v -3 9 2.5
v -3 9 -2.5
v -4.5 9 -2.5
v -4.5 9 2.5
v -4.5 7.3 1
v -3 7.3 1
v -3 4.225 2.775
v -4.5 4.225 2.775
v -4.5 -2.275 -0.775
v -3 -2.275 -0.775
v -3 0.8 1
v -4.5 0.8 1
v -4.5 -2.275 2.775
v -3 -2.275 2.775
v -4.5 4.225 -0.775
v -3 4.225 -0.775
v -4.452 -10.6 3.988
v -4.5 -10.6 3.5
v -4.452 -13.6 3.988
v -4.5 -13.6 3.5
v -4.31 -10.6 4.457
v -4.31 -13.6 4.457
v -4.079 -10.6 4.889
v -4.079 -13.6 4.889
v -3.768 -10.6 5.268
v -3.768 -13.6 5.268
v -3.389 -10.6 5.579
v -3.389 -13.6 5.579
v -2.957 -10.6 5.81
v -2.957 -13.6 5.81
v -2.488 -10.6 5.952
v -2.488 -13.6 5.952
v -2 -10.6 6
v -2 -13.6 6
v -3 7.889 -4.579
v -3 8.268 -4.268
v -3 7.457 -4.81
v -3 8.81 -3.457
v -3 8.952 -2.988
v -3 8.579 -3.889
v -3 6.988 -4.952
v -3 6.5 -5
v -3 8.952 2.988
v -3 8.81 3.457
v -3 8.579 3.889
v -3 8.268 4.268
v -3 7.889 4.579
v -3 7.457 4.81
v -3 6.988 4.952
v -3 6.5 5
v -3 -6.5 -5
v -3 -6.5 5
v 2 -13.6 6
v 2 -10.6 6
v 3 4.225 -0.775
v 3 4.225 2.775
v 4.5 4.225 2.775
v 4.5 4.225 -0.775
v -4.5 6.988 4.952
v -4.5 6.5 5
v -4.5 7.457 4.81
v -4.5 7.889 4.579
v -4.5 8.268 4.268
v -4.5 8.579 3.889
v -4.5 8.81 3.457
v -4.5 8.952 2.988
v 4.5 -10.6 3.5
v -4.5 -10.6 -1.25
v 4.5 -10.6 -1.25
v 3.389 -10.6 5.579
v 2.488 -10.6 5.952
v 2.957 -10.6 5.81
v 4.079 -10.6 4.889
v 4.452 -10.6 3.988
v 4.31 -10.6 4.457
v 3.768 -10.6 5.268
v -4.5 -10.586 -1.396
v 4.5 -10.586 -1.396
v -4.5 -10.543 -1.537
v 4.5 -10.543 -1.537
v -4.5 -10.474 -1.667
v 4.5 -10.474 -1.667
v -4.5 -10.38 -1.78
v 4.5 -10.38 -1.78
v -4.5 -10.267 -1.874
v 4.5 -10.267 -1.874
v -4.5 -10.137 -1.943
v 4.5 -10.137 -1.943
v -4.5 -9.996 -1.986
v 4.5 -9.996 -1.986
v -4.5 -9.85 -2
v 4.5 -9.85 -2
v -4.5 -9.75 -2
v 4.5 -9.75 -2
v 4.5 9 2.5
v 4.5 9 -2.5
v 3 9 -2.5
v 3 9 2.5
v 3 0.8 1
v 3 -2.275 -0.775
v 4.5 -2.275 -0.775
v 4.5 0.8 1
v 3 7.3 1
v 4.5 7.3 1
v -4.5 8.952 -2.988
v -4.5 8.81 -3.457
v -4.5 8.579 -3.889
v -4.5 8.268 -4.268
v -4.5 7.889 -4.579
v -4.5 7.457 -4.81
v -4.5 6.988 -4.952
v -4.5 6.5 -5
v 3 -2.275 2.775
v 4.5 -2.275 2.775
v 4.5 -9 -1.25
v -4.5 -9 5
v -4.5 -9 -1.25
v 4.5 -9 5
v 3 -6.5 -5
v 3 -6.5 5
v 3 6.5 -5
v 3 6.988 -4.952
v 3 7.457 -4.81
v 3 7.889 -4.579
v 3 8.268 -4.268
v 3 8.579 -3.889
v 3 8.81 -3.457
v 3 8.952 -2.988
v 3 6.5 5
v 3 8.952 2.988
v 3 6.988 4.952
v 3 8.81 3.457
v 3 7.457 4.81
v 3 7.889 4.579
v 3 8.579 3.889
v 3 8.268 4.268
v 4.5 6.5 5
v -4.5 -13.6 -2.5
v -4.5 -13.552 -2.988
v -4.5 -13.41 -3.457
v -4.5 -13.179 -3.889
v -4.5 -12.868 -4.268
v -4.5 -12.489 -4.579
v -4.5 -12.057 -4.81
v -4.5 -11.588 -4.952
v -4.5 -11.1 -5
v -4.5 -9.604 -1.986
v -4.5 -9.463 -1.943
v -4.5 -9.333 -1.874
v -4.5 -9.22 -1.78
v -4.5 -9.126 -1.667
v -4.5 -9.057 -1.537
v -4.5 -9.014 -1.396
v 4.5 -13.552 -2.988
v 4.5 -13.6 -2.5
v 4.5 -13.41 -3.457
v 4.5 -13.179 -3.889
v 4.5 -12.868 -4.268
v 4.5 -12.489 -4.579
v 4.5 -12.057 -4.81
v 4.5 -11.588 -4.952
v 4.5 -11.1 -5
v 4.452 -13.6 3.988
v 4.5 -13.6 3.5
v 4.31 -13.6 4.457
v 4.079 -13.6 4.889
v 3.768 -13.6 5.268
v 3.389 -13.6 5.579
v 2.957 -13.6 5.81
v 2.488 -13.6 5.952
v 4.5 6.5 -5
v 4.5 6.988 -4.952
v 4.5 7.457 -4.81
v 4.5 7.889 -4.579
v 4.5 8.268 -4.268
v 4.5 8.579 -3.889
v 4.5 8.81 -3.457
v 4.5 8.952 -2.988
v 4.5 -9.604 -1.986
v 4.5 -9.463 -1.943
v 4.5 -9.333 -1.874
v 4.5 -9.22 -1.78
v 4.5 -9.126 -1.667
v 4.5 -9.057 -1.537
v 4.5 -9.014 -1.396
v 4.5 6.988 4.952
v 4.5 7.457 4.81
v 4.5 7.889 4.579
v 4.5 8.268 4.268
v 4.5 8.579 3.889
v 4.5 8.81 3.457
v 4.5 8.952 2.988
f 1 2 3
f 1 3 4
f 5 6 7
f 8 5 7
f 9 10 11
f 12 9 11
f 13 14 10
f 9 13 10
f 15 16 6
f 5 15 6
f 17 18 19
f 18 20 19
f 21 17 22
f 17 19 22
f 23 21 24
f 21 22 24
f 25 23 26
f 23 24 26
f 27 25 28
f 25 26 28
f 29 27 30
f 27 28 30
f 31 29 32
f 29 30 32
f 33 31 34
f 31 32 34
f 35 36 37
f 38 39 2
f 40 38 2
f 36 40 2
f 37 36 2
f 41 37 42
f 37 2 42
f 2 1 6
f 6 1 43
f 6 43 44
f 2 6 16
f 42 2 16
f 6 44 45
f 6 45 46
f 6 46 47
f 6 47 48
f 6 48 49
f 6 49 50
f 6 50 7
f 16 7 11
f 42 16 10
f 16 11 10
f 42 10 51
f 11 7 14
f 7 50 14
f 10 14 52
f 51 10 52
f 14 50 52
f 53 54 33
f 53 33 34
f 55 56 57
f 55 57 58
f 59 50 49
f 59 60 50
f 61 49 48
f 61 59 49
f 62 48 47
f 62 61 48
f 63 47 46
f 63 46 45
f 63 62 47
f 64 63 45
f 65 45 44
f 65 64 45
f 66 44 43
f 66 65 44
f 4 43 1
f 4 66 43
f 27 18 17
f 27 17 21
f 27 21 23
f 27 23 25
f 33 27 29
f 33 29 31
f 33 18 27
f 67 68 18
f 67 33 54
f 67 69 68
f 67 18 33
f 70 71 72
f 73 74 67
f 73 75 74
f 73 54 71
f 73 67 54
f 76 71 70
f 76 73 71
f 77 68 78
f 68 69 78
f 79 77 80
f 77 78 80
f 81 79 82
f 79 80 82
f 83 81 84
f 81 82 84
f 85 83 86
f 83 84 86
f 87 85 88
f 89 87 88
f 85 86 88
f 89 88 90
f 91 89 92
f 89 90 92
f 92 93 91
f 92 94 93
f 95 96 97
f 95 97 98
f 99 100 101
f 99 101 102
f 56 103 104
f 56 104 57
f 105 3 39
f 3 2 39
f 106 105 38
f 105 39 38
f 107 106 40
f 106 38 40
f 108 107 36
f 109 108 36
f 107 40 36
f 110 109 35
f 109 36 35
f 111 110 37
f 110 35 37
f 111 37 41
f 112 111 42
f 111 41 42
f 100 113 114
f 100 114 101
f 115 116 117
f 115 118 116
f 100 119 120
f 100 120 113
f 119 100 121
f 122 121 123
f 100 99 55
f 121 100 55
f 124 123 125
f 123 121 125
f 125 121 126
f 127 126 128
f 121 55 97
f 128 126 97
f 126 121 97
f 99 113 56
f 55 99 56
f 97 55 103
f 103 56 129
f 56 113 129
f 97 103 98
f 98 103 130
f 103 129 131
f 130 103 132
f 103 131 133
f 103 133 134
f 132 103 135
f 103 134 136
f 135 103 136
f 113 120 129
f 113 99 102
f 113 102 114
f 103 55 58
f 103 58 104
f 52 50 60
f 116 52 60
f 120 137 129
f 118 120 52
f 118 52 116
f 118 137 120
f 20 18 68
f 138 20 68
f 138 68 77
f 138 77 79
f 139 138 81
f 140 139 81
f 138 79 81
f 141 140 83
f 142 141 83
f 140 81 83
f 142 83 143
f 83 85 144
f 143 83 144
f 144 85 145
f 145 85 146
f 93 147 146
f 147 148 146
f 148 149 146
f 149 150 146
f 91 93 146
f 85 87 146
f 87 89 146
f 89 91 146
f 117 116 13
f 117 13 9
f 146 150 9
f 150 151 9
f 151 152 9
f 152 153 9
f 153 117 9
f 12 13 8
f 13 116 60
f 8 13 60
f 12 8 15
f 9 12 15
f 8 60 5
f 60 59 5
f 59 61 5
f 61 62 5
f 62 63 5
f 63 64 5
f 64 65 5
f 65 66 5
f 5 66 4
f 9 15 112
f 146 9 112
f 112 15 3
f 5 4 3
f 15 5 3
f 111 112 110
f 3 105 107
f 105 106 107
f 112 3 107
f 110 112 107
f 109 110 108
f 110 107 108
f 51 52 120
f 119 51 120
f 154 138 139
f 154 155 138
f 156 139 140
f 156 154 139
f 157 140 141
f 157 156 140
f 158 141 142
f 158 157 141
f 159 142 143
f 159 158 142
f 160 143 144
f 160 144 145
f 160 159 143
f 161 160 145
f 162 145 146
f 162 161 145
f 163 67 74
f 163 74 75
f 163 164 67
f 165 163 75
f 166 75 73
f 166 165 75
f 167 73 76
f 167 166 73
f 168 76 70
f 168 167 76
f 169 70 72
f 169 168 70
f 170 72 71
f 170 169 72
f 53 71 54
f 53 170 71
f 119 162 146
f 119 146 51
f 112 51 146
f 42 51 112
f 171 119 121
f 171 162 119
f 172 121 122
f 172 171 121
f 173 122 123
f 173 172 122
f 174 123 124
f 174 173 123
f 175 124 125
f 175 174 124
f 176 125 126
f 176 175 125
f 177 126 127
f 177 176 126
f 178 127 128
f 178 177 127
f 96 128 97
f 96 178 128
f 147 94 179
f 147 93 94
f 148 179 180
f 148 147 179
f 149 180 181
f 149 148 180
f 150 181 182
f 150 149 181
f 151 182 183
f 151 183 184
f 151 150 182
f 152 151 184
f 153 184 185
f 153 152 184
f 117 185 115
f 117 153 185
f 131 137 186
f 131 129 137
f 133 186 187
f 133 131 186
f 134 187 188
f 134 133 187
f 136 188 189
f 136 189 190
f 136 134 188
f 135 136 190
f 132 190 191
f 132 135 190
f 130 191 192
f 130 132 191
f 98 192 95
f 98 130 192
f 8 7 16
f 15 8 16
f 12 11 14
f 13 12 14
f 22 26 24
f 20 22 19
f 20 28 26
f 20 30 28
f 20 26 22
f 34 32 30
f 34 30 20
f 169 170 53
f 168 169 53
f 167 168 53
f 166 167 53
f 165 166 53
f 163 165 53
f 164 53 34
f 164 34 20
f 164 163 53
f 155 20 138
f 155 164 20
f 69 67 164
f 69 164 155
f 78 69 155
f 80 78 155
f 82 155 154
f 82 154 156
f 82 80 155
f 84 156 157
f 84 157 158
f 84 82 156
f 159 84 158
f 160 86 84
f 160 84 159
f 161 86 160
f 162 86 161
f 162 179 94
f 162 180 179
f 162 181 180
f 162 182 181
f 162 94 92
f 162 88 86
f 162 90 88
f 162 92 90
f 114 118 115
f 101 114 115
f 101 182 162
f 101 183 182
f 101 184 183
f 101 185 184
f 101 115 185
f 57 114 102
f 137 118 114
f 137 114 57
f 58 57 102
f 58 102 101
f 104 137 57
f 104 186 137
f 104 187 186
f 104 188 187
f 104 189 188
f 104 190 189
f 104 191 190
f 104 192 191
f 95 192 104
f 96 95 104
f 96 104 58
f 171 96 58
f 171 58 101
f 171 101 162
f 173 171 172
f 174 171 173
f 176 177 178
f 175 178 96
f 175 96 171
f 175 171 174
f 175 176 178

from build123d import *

# Parameters (mm, degrees)
BOSS_EXTRUDE1_DEPTH     = 4.5
CUT_EXTRUDE1_DEPTH      = 10
CUT_EXTRUDE2_DEPTH      = 5.5
CUT_EXTRUDE2_DEPTH_BACK = 5.5
FILLET1_R               = 2.5
FILLET2_R               = 0.75


with BuildPart() as part:
    # Sketch2 → Boss-Extrude1 (new body, symmetric)
    with BuildSketch(Plane(origin=(0, 0, 0), x_dir=(0, 0, -1), z_dir=(1, 0, 0))):
        Polygon((2, -9), (2, -10.6), (-6, -10.6), (-6, -13.6), (5, -13.6), (5, -9), (5, 9), (-5, 9), (-5, -9), align=None)
    extrude(amount=BOSS_EXTRUDE1_DEPTH, both=True)

    # Sketch3 → Cut-Extrude1 (cut)
    with BuildSketch(Plane.XY.offset(5)):
        Polygon((-3, 6.5), (-3, -6.5), (3, -6.5), (3, 6.5), (3, 9), (-3, 9), align=None)
    extrude(amount=-CUT_EXTRUDE1_DEPTH, mode=Mode.SUBTRACT)

    # Sketch4 → Cut-Extrude2 (cut, two sides)
    with BuildSketch(Plane(origin=(0, 0, 0), x_dir=(0, 0, -1), z_dir=(1, 0, 0))) as cut_extrude2_sk:
        Polygon((0.775352078, 4.225), (-1, 7.3), (-2.775352078, 4.225), align=None)
        Polygon((0.775352078, -2.275), (-1, 0.8), (-2.775352078, -2.275), align=None)
    extrude(amount=CUT_EXTRUDE2_DEPTH, mode=Mode.SUBTRACT)
    extrude(cut_extrude2_sk.sketch, amount=-CUT_EXTRUDE2_DEPTH_BACK, mode=Mode.SUBTRACT)

    # Fillet1
    fillet1_edges = [part.edges().sort_by_distance(p)[0] for p in [
        (0, -13.6, -5),
        (3.75, 9, 5),
        (3.75, 9, -5),
        (4.5, -12.1, 6),
        (-3.75, 9, 5),
        (-3.75, 9, -5),
        (-4.5, -12.1, 6),
    ]]
    fillet(fillet1_edges, radius=FILLET1_R)

    # Fillet2
    fillet2_edges = [part.edges().sort_by_distance(p)[0] for p in [
        (0, -10.6, -2),
        (0, -9, -2),
    ]]
    fillet(fillet2_edges, radius=FILLET2_R)


solid = part.part
